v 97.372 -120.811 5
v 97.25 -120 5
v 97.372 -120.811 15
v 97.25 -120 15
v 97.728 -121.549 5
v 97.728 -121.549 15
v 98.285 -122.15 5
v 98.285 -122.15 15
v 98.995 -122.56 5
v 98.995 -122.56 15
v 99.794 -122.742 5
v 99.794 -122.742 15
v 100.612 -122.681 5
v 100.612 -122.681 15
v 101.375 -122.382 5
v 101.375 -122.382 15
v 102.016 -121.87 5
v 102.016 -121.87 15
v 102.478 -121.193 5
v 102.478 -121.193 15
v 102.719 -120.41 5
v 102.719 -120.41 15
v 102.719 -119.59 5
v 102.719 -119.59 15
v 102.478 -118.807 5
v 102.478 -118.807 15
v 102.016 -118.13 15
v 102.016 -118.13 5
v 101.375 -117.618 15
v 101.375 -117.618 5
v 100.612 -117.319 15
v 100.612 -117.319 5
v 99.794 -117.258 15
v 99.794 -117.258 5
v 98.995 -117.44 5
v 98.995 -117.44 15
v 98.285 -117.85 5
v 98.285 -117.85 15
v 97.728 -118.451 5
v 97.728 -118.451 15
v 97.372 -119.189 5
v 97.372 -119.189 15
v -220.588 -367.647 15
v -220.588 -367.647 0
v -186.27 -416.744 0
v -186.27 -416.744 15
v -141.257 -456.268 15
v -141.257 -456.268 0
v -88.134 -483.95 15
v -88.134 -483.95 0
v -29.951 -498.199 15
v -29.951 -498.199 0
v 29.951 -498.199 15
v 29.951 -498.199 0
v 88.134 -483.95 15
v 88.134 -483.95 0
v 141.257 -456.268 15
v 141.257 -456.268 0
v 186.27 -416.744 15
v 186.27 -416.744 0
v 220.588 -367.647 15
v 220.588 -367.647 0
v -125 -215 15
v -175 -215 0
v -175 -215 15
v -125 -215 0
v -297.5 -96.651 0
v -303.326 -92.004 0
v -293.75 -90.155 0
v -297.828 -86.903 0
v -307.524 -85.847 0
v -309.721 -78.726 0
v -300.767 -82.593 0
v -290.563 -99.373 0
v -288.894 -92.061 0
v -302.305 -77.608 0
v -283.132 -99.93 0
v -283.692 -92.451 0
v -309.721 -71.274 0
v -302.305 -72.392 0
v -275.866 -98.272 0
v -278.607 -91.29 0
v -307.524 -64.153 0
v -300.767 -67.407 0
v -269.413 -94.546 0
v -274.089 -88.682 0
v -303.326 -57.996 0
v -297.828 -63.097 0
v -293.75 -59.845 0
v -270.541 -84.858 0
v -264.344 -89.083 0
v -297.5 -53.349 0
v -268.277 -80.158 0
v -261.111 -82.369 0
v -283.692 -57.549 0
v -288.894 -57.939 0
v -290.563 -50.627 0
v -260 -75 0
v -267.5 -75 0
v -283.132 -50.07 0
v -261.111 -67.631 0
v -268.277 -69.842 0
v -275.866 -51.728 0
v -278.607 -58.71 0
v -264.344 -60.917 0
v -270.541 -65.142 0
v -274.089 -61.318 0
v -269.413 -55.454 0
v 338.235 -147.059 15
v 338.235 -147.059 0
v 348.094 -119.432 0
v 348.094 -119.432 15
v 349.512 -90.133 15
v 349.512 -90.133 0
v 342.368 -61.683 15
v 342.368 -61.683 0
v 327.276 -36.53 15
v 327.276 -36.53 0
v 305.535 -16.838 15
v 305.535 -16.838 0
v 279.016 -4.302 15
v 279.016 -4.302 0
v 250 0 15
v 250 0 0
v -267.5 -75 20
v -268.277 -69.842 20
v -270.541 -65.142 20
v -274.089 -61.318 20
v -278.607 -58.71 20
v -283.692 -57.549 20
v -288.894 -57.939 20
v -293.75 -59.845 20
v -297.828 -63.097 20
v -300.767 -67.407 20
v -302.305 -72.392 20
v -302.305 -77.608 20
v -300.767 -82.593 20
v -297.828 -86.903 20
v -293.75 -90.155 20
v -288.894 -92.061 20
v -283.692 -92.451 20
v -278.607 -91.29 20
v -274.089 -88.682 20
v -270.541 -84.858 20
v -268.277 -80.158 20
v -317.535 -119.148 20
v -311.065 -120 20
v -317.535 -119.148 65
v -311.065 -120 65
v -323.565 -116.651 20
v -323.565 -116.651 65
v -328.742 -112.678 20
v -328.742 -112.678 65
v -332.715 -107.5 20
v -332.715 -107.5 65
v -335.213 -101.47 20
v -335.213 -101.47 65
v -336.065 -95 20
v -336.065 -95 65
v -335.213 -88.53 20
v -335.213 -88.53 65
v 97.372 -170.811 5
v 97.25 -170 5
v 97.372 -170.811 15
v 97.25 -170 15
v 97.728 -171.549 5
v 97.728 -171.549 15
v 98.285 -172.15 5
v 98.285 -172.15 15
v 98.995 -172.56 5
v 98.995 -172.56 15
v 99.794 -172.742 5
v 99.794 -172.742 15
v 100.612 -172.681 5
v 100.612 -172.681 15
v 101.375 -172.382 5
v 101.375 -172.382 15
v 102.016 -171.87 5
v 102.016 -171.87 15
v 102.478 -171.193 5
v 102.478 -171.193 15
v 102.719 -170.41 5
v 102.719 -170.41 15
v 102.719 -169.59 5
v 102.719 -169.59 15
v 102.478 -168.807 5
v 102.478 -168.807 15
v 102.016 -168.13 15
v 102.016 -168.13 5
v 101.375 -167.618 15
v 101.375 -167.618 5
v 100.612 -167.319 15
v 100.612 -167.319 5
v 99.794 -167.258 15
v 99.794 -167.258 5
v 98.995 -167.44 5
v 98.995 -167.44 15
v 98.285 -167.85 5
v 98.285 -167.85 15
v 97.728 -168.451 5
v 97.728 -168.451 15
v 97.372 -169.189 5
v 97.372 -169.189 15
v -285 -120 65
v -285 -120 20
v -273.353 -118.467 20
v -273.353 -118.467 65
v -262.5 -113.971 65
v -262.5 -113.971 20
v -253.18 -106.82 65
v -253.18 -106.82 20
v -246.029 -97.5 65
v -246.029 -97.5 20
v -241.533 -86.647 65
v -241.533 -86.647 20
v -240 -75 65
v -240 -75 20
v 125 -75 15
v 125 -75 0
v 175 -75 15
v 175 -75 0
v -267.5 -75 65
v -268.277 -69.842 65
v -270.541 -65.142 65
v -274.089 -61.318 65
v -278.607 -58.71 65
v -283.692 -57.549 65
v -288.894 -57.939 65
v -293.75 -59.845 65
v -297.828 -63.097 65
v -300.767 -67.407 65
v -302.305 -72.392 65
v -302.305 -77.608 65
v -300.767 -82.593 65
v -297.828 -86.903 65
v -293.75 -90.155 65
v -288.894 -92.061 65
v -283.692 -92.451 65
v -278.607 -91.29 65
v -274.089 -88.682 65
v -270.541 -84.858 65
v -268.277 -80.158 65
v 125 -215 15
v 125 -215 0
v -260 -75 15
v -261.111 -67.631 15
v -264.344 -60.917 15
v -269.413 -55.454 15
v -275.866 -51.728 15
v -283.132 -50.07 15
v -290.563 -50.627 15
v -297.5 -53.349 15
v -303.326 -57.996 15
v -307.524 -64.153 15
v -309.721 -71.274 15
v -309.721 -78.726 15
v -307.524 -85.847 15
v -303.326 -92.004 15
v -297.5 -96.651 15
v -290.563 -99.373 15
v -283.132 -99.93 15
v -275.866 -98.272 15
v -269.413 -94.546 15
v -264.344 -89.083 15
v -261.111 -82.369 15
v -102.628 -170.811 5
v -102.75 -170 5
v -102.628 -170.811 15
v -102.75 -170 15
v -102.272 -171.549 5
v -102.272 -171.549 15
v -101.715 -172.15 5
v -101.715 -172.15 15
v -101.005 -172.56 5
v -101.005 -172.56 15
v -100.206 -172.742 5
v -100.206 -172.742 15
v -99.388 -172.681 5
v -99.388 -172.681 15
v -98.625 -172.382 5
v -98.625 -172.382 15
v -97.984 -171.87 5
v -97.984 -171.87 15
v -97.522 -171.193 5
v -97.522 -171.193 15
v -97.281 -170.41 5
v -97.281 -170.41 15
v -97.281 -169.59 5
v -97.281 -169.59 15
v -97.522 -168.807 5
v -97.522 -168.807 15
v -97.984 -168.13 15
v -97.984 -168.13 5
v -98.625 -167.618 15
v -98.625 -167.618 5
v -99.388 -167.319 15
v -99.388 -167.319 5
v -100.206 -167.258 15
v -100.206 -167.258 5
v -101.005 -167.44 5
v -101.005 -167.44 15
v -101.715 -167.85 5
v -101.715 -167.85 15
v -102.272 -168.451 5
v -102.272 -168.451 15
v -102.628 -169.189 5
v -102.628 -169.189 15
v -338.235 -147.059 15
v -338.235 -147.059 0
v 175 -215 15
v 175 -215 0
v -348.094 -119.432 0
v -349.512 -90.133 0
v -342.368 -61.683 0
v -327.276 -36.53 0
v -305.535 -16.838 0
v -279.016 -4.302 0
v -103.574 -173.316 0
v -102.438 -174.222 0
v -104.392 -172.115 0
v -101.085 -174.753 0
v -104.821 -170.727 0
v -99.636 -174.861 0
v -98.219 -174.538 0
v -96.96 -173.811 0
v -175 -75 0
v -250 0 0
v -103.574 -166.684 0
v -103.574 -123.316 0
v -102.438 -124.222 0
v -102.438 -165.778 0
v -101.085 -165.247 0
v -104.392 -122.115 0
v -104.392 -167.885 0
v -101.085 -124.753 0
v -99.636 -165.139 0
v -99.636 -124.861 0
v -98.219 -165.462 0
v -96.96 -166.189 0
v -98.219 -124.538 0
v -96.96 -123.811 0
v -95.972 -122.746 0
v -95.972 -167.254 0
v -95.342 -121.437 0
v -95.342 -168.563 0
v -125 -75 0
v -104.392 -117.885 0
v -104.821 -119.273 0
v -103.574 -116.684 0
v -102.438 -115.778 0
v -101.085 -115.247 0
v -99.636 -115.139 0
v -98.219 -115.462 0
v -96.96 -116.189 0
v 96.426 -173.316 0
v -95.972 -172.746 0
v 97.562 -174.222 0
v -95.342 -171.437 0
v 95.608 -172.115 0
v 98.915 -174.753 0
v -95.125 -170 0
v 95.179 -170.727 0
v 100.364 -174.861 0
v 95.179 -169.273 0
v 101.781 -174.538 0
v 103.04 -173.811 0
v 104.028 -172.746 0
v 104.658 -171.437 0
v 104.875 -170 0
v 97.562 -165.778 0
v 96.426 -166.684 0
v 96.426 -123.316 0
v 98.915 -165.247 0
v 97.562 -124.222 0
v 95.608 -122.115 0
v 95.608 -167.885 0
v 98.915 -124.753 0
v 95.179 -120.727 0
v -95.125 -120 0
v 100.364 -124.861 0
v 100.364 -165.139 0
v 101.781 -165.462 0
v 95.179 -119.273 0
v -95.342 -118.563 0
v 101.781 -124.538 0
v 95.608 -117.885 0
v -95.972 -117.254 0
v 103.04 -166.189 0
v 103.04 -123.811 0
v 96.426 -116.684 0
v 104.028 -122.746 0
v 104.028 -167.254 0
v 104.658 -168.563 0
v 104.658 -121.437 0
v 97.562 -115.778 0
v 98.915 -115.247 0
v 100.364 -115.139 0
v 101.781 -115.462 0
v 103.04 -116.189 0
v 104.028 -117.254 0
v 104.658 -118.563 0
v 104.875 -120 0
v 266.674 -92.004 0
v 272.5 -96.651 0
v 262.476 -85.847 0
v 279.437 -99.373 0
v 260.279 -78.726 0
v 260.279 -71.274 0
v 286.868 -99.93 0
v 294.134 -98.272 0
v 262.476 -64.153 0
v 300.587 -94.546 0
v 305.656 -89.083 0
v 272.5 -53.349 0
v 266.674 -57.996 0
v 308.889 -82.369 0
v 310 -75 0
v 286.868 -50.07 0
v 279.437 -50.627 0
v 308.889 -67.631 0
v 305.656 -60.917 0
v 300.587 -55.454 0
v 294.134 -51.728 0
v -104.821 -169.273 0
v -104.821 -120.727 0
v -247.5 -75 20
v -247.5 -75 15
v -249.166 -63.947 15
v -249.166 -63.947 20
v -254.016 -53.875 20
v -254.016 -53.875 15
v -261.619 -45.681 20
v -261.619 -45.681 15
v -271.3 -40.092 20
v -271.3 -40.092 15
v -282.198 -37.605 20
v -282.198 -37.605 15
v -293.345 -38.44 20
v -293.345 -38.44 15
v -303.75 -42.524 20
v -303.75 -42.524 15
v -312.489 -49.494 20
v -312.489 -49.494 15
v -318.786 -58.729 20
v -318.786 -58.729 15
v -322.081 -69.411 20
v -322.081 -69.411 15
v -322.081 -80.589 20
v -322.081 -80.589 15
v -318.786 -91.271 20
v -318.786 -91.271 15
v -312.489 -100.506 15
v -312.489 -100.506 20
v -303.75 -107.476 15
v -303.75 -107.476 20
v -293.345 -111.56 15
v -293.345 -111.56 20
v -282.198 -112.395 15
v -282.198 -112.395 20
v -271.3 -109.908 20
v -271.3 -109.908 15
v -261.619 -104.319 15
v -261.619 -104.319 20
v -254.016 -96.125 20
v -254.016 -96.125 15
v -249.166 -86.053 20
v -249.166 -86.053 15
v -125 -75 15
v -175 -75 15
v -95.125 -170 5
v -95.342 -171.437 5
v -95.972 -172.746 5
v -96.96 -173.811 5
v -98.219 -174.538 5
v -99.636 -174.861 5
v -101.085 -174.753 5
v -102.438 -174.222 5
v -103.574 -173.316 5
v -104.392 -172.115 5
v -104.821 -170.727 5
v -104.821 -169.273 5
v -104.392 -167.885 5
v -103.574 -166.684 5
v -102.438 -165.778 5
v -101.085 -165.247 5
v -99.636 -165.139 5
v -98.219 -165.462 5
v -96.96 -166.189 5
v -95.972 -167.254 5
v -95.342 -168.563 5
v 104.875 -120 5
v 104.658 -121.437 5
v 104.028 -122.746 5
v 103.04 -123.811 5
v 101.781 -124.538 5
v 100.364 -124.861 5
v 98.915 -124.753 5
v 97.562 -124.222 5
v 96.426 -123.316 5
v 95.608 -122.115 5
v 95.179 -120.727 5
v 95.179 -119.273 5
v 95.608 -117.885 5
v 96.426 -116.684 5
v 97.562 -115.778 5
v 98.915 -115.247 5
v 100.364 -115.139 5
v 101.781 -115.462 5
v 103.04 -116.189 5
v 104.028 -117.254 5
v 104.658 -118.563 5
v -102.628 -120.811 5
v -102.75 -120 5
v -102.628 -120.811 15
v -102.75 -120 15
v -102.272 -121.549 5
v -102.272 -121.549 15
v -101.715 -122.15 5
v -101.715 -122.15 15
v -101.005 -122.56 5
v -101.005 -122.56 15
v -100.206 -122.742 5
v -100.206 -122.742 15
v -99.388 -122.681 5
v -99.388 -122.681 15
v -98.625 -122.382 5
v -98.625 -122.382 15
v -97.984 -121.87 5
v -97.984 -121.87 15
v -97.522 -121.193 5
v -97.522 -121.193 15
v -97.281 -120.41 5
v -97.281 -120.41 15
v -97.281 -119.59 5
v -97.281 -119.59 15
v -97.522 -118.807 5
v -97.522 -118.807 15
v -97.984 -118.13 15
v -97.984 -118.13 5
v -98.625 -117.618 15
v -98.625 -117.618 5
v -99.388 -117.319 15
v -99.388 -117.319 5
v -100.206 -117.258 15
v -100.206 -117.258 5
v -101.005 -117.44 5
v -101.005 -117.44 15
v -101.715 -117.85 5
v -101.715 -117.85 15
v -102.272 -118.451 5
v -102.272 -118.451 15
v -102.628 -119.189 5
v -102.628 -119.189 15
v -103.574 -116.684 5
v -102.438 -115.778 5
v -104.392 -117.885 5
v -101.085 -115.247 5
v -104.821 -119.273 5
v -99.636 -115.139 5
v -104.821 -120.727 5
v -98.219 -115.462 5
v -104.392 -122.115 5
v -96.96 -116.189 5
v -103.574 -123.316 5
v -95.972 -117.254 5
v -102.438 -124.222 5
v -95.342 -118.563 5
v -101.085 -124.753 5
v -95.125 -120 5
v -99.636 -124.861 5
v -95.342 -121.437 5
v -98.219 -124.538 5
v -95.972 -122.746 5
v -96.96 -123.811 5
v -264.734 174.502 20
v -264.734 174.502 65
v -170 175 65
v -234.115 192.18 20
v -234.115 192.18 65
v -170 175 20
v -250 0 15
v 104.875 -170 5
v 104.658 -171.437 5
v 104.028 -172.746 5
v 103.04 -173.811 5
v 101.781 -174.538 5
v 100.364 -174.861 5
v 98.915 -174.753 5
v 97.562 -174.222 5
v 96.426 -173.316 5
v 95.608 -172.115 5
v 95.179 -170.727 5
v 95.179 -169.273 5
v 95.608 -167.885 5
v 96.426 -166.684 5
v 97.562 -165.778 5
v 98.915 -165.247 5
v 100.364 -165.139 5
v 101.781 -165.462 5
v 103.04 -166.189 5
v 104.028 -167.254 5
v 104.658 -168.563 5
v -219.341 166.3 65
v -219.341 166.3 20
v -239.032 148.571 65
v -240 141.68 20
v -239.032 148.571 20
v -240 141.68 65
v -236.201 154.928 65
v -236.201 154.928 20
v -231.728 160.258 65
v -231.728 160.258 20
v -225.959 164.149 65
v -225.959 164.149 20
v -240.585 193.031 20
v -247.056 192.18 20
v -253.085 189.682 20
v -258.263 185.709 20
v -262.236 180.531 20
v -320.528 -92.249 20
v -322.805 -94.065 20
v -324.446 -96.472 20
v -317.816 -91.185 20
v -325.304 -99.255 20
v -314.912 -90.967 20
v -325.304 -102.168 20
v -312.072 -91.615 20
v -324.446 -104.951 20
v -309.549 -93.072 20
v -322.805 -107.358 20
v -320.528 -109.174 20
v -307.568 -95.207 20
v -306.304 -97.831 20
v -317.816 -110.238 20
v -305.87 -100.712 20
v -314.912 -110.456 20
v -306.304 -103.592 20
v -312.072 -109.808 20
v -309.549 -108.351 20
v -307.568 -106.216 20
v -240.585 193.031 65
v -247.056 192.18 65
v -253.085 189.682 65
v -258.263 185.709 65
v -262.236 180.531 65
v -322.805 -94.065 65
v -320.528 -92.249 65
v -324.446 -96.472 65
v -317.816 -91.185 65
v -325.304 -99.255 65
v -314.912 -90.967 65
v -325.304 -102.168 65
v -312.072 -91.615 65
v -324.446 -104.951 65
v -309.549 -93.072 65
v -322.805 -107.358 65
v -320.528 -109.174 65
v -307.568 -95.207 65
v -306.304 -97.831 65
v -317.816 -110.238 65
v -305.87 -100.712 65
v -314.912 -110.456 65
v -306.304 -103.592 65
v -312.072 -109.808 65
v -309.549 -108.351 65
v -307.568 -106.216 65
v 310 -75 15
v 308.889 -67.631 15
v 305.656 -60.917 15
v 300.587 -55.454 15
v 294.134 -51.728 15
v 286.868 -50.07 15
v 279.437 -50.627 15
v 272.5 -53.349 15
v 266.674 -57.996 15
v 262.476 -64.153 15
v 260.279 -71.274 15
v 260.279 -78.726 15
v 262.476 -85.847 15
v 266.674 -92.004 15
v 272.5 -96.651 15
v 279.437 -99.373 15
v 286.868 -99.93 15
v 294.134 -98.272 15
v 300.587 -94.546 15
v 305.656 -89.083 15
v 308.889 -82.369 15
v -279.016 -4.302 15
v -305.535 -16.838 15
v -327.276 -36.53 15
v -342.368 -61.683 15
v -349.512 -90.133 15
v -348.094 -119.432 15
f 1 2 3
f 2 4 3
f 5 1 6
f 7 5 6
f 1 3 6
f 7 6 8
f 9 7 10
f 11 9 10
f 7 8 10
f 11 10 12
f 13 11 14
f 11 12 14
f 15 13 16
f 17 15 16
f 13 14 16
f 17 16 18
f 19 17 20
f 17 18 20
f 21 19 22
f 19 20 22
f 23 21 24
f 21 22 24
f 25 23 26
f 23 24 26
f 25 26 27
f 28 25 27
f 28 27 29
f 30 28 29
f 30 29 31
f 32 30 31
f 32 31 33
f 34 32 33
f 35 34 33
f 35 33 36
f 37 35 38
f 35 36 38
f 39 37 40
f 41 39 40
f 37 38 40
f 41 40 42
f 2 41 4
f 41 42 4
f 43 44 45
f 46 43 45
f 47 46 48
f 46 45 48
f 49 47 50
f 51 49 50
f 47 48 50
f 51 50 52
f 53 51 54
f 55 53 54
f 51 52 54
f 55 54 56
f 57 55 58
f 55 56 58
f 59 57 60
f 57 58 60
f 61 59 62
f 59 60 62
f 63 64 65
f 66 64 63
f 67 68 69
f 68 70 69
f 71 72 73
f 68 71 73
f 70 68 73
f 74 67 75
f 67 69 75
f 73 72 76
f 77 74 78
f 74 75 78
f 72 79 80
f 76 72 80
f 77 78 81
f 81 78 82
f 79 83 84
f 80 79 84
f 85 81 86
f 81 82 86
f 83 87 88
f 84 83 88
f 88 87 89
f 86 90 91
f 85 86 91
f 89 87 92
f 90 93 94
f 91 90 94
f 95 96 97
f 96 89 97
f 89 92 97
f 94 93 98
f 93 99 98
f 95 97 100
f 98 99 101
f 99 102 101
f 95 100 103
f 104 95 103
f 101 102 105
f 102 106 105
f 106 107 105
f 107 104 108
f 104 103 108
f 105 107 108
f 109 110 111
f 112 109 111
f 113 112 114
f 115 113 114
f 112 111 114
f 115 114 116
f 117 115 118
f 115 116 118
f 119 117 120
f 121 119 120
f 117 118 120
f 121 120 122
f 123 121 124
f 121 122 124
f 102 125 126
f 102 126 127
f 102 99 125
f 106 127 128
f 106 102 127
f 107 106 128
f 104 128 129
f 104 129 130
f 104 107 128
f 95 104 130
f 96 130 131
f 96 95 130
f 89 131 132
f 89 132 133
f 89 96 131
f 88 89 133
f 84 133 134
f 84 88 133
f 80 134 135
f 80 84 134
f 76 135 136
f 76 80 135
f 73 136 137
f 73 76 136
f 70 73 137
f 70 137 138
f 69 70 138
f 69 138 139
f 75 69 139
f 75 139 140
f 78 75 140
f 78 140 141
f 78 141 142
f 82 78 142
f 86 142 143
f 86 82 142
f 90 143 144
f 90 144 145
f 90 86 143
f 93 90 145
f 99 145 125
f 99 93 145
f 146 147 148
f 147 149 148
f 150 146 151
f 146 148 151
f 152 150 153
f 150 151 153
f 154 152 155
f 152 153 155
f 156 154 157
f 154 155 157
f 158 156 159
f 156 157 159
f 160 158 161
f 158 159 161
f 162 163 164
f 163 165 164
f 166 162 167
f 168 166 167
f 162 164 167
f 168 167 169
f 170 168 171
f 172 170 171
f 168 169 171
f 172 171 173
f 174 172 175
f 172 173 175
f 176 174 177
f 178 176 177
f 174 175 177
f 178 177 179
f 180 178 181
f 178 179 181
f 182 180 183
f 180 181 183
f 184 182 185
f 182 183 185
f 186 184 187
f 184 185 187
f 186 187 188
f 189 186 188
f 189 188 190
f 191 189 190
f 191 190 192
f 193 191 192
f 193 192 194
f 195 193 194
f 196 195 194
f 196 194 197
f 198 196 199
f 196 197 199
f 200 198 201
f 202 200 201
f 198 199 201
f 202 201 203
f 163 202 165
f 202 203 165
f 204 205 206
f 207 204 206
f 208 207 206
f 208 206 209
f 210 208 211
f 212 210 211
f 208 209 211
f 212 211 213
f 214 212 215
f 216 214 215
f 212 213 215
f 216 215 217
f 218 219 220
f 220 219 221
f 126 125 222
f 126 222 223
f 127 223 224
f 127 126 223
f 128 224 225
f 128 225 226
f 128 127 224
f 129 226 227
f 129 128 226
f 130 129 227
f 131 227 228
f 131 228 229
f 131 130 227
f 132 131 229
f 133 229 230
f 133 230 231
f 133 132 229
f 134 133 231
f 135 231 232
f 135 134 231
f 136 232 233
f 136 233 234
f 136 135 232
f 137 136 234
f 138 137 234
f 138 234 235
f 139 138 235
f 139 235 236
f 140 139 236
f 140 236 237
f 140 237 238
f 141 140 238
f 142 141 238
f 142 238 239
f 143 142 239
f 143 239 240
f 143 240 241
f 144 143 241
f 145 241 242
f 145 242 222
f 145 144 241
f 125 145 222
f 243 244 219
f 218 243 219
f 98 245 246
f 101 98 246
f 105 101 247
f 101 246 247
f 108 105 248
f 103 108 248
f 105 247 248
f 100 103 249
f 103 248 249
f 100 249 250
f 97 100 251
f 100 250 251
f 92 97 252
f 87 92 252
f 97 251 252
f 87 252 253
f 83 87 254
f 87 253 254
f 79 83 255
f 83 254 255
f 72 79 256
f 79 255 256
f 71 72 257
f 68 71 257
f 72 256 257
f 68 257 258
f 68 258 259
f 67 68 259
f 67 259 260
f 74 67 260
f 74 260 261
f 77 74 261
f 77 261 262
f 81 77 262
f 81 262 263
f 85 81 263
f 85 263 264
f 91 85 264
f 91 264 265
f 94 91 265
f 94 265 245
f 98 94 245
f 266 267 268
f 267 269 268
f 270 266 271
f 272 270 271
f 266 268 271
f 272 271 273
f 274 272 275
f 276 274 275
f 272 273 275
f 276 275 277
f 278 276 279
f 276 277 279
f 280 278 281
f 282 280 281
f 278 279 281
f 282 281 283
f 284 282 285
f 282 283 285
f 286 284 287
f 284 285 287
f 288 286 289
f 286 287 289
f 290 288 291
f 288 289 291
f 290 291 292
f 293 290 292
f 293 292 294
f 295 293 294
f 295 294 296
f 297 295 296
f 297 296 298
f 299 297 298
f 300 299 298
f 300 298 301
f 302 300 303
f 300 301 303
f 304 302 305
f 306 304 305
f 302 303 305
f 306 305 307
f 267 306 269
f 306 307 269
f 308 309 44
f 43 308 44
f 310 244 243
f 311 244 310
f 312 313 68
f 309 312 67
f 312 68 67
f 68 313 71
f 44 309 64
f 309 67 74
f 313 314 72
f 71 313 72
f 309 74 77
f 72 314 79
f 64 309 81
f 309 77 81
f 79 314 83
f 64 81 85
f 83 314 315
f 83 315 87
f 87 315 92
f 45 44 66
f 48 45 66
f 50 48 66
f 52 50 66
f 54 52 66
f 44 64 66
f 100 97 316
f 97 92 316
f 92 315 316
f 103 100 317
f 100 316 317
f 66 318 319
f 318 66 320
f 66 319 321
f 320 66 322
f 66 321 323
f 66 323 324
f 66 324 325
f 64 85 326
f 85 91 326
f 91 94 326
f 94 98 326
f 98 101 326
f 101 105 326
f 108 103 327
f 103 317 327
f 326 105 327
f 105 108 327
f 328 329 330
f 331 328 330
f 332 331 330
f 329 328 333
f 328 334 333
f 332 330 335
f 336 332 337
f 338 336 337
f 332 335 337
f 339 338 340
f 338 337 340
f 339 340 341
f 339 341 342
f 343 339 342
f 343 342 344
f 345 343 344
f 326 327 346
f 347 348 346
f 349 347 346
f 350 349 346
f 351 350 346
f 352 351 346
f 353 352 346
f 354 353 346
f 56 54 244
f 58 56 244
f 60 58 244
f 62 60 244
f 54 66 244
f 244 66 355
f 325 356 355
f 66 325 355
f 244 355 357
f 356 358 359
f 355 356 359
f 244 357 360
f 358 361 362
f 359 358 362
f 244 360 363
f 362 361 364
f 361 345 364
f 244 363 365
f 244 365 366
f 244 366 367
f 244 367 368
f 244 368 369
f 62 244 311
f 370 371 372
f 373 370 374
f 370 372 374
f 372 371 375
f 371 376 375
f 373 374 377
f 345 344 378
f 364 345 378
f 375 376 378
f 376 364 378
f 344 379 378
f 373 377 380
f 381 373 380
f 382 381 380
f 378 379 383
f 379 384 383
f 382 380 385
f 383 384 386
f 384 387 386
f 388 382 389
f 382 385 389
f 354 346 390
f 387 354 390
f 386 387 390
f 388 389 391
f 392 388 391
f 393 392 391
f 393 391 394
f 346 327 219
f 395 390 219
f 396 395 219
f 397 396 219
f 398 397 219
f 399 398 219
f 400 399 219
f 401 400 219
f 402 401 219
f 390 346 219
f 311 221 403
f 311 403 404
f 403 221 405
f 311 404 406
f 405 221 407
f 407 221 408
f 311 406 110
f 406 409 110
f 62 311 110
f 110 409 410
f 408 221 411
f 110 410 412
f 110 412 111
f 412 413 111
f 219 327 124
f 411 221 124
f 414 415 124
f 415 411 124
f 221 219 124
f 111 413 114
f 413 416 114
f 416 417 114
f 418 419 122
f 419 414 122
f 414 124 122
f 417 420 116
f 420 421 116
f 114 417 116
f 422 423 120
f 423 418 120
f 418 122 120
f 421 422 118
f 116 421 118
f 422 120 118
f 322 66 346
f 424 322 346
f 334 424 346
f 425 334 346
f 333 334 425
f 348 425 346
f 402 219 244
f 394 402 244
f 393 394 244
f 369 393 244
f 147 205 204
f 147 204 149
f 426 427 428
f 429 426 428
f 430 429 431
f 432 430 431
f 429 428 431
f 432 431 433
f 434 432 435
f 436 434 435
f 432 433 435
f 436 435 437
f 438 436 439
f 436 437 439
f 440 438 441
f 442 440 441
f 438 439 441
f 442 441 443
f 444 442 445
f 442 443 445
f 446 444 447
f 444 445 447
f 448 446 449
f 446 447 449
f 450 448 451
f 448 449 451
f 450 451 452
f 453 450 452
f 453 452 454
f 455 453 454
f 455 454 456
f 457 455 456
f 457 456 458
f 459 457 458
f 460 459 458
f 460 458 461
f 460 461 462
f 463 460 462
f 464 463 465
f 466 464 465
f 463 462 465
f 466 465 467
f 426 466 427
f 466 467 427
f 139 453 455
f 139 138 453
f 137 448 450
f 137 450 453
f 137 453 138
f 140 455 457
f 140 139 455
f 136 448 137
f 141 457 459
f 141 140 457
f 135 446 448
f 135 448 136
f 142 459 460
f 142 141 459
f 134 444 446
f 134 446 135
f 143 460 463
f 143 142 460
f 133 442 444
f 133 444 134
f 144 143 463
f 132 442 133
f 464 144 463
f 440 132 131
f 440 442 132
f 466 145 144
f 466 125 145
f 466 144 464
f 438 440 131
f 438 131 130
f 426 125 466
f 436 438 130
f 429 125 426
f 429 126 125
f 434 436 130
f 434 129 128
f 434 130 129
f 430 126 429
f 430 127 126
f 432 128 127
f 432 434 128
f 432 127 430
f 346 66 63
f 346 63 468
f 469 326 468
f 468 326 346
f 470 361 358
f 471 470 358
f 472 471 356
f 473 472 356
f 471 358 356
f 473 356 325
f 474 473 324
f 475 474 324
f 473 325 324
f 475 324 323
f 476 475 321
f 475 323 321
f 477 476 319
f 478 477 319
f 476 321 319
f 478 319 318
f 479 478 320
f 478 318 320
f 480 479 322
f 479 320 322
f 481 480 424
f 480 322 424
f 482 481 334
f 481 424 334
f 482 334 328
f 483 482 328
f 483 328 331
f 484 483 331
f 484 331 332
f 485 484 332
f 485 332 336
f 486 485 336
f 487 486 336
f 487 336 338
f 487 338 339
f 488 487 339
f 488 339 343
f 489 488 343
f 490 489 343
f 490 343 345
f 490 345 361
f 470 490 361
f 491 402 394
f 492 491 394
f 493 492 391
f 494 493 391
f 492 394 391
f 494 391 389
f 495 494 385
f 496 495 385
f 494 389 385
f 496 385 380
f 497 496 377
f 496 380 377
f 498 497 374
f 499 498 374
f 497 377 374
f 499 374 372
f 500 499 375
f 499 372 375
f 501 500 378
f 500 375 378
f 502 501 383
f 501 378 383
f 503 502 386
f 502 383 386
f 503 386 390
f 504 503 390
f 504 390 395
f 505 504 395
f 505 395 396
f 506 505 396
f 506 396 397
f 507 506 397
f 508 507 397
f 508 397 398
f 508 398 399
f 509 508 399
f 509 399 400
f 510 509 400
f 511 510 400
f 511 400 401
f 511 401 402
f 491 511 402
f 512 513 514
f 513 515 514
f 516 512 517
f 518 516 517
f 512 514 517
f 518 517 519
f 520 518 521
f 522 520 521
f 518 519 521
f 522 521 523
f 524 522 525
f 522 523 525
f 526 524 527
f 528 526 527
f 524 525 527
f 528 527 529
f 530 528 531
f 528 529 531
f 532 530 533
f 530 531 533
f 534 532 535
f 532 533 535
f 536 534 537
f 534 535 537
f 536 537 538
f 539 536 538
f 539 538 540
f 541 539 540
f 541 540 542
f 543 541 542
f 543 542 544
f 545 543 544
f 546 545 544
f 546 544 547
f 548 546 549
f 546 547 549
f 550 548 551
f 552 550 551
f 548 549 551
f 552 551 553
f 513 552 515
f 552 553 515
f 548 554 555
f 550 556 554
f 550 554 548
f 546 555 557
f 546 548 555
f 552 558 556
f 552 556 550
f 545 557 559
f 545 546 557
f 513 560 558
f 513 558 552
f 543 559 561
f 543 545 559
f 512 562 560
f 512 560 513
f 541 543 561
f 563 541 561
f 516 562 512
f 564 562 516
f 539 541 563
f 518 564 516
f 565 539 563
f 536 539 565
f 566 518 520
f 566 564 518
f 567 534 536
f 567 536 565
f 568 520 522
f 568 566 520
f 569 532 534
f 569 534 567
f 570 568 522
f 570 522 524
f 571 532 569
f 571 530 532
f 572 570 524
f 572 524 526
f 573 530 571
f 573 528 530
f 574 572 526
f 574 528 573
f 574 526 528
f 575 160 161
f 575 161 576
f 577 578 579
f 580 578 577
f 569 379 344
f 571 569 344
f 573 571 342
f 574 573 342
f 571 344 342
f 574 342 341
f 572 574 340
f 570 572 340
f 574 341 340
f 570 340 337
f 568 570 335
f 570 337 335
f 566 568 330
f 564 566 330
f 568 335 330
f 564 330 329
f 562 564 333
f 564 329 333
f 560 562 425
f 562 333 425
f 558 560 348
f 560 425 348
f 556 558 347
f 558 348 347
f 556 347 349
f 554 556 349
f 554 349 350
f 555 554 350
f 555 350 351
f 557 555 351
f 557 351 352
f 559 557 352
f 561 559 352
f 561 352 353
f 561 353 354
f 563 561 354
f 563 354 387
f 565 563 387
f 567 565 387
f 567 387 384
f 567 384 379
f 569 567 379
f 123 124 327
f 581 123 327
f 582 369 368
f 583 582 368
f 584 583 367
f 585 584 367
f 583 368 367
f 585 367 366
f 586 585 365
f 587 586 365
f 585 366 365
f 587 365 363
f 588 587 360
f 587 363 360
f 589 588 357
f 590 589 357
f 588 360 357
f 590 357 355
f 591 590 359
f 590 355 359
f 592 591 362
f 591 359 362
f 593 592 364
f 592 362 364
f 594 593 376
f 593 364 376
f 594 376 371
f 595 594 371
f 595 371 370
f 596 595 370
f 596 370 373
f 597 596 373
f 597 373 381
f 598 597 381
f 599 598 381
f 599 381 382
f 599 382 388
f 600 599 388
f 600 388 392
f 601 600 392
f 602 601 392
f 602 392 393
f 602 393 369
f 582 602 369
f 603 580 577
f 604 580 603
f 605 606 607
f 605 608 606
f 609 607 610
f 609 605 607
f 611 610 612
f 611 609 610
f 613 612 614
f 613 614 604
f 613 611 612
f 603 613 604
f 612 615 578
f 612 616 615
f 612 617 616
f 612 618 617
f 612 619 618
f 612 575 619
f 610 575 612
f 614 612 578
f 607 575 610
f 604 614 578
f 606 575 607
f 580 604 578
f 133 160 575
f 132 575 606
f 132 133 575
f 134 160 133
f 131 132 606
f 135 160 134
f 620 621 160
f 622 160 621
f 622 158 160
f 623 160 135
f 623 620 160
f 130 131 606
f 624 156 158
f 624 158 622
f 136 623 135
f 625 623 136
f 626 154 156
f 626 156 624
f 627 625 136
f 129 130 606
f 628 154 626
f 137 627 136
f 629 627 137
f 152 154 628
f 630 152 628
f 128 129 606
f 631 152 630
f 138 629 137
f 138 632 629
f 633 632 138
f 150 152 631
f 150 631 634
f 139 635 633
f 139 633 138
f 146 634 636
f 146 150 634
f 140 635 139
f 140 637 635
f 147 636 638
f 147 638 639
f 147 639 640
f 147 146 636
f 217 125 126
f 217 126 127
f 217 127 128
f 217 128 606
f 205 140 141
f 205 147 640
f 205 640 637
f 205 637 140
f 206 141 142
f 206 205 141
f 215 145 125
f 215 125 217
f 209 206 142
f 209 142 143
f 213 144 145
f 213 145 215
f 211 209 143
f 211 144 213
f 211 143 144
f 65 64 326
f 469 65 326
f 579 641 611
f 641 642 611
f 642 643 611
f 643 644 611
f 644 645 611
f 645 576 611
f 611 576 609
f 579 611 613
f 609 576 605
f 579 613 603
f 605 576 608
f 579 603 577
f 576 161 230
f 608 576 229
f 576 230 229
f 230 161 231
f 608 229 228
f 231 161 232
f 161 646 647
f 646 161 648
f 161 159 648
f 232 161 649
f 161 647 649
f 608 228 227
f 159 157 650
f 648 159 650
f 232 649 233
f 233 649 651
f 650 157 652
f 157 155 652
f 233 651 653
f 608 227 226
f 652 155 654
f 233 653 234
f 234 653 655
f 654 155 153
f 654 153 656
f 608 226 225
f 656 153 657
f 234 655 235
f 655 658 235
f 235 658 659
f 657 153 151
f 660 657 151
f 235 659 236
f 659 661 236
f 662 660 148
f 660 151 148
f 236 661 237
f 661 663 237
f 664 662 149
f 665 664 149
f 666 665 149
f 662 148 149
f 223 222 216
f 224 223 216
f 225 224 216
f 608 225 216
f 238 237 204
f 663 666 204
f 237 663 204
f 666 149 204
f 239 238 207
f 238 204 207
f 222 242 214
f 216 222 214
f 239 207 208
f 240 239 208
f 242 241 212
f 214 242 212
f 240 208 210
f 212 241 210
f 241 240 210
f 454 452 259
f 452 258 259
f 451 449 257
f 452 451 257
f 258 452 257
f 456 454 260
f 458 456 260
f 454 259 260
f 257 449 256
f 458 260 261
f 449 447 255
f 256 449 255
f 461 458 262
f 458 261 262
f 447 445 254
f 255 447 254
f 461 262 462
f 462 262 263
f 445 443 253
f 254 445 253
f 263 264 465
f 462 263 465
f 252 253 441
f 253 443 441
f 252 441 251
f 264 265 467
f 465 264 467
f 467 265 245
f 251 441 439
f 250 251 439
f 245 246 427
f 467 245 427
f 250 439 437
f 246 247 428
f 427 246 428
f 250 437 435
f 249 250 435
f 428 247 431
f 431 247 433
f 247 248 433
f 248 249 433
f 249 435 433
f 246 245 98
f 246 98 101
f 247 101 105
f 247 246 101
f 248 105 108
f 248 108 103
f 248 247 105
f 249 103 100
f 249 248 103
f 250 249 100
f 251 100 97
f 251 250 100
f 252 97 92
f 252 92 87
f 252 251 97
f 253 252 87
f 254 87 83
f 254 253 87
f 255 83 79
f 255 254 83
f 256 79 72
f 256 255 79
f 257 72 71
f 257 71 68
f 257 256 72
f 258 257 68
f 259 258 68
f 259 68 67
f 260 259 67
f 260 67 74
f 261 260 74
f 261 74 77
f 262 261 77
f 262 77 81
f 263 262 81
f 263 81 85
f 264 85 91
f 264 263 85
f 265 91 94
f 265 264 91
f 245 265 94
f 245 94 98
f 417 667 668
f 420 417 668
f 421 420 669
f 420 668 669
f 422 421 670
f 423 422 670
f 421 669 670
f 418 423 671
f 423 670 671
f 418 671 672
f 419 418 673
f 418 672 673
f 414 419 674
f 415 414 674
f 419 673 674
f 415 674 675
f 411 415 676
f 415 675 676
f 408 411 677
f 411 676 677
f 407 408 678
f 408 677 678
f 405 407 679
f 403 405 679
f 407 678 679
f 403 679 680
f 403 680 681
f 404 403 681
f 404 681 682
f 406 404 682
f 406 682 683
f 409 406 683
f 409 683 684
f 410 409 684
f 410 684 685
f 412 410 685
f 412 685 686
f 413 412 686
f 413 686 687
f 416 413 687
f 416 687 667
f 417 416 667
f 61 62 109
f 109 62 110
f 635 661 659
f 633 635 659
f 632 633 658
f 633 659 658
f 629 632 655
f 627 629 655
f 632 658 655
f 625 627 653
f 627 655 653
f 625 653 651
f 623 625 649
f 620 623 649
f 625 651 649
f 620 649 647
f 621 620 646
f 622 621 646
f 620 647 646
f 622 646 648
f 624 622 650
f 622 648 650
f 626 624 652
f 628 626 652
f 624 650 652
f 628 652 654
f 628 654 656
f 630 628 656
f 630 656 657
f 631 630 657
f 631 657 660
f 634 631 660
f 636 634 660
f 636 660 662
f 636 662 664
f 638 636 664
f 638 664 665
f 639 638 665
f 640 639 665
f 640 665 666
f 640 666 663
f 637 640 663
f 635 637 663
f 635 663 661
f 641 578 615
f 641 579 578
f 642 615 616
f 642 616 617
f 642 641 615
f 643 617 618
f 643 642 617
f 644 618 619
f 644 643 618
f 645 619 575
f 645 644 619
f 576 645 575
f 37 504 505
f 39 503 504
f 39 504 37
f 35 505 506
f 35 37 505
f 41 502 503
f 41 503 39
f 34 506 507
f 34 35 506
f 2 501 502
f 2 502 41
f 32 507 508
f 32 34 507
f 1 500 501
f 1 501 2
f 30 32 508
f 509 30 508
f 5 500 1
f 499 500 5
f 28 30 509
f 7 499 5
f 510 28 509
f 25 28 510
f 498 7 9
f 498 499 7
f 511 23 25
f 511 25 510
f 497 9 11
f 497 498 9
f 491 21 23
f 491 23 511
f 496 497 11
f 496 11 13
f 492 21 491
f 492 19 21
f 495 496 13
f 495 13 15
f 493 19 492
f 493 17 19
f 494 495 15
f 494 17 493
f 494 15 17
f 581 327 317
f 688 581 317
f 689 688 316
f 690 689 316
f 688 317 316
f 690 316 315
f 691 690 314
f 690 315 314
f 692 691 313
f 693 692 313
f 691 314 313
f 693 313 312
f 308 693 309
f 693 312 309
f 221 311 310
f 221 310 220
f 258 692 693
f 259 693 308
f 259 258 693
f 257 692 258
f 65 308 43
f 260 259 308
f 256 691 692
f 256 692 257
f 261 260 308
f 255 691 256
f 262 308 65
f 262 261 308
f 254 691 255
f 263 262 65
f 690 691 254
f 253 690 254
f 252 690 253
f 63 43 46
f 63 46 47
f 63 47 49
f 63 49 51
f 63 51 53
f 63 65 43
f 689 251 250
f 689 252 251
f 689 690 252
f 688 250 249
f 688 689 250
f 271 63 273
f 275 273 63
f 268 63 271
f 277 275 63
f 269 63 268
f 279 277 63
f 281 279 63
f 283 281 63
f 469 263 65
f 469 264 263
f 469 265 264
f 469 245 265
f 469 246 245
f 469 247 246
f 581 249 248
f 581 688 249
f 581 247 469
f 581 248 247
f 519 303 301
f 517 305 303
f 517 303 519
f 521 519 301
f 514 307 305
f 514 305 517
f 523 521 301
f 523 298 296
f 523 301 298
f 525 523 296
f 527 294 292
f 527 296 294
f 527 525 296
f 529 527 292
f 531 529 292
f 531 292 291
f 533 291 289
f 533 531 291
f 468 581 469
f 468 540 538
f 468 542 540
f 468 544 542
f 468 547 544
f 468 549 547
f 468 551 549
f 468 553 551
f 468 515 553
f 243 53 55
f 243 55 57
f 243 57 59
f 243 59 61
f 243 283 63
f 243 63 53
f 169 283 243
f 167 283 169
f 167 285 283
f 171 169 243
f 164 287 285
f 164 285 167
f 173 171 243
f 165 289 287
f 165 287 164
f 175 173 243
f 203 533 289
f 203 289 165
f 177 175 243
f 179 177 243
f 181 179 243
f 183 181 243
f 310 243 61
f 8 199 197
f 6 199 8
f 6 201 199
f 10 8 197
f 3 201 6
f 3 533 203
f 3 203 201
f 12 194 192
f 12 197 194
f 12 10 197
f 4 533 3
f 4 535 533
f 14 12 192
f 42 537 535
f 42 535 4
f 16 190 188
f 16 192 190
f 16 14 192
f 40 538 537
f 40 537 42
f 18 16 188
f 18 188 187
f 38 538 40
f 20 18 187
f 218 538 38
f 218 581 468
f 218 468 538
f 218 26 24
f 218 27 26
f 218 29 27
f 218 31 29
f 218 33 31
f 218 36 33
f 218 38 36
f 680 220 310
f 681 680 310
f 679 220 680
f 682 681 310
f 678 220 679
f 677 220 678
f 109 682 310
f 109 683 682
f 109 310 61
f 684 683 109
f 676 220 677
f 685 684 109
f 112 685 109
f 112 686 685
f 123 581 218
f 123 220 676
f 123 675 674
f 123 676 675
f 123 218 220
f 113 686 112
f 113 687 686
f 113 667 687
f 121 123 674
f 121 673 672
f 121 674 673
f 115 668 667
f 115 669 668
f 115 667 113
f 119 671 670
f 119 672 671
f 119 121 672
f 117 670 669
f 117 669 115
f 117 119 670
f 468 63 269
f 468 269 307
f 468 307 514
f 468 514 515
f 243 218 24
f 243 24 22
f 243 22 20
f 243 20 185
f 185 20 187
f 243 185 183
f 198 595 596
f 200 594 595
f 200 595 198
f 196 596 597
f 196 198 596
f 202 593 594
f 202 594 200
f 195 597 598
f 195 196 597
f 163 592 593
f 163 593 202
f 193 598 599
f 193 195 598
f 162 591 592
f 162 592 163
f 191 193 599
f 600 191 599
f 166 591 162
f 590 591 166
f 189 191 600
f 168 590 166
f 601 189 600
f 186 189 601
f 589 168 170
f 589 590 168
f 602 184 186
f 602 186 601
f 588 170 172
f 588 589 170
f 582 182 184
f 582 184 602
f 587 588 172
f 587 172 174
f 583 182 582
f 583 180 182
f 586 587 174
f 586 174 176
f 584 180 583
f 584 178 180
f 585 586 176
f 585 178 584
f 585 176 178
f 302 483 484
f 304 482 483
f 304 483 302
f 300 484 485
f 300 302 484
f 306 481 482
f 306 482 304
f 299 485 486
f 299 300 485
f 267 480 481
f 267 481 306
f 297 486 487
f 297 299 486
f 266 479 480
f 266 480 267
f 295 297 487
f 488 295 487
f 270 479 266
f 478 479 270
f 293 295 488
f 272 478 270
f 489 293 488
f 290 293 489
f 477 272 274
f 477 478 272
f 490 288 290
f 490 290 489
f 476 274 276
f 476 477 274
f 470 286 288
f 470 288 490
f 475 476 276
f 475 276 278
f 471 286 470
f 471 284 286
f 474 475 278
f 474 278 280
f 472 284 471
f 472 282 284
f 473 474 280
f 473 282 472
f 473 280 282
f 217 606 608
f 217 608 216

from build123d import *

# Parameters (mm, degrees)
F0_W           = 50
F0_H           = 140
F1_DEPTH       = 15
F2_R           = 25
F3_DEPTH       = 15.001
F4_R           = 25
F4_R_2         = 17.5
F5_DEPTH       = 15
F6_R           = 37.5
F6_R_2         = 17.5
F7_DEPTH       = 5
F9_D           = 5.5
F9_CBORE_D     = 9.75
F9_CBORE_DEPTH = 5
F10_R          = 45
F10_R_2        = 17.5
F11_DEPTH      = 45
F12_R          = 17.5
F13_DEPTH      = 45
F14_R          = 9.7715412821
F15_DEPTH      = 65.001
F16_R          = 25


with BuildPart() as f1:
    # F0 (on Top) → F1 (new body)
    with BuildSketch(Plane.XY):
        with BuildLine():
            Line((250, 0), (-250, 0))
            ThreePointArc((-250, 0), (-335.7492925713, -48.5504244572), (-338.2352941176, -147.0588235294))
            Line((-338.2352941176, -147.0588235294), (-220.5882352941, -367.6470588235))
            ThreePointArc((-220.5882352941, -367.6470588235), (0, -500), (220.5882352941, -367.6470588235))
            Line((220.5882352941, -367.6470588235), (338.2352941176, -147.0588235294))
            ThreePointArc((338.2352941176, -147.0588235294), (335.7492925713, -48.5504244572), (250, 0))
        make_face()
        with Locations((-150, -145)):
            Rectangle(F0_W, F0_H, mode=Mode.SUBTRACT)
        with Locations((150, -145)):
            Rectangle(F0_W, F0_H, mode=Mode.SUBTRACT)
    extrude(amount=F1_DEPTH)

    # F2 (on face) → F3 (cut, through all)
    with BuildSketch(Plane.XY.offset(15)):
        with Locations((-285, -75)):
            Circle(F2_R)
        with Locations((285, -75)):
            Circle(F2_R)
    extrude(amount=-F3_DEPTH, mode=Mode.SUBTRACT)

    # F9 (through all)
    with Locations(Plane(origin=(0, 0, 0), x_dir=(1, 0, 0), z_dir=(0, 0, -1))):
        with Locations((-100, 120), (-100, 170), (100, 120), (100, 170)):
            CounterBoreHole(F9_D / 2, F9_CBORE_D / 2, F9_CBORE_DEPTH)


with BuildPart() as f5:
    # F4 (on face) → F5 (new body)
    with BuildSketch(Plane.XY.offset(15)):
        with Locations((-285, -75)):
            Circle(F4_R)
        with Locations((-285, -75)):
            Circle(F4_R_2, mode=Mode.SUBTRACT)
    extrude(amount=-F5_DEPTH)

    # F6 (on face) → F7 (join)
    with BuildSketch(Plane.XY.offset(15)):
        with Locations((-285, -75)):
            Circle(F6_R)
        with Locations((-285, -75)):
            Circle(F6_R_2, mode=Mode.SUBTRACT)
    extrude(amount=F7_DEPTH)


with BuildPart() as f11:
    # F10 (on face) → F11 (new body)
    with BuildSketch(Plane.XY.offset(20)):
        with Locations((-285, -75)):
            Circle(F10_R)
        with Locations((-285, -75)):
            Circle(F10_R_2, mode=Mode.SUBTRACT)
    extrude(amount=F11_DEPTH)

    # F12 (on face) → F13 (join, through all)
    with BuildSketch(Plane(origin=(0, 0, 20), x_dir=(1, 0, 0), z_dir=(0, 0, -1))):
        with BuildLine():
            Line((-240, -162.6571113504), (-240, 75))
            ThreePointArc((-240, 75), (-253.1801948466, 106.8198051534), (-285, 120))
            Line((-285, 120), (-343.6451417779, 120))
            Line((-343.6451417779, 120), (-258.2631229006, -198.6500325027))
            Line((-258.2631229006, -198.6500325027), (-170, -175))
            Line((-170, -175), (-240, -162.6571113504))
        make_face()
        with Locations((-285, 75)):
            Circle(F12_R, mode=Mode.SUBTRACT)
    extrude(amount=-F13_DEPTH)

    # F14 (on face) → F15 (cut, through all)
    with BuildSketch(Plane.XY.offset(65)):
        with Locations((-315.6417777248, -100.7115043875)):
            Circle(F14_R)
    extrude(amount=-F15_DEPTH, mode=Mode.SUBTRACT)

    # F16
    f16_edges = [f11.edges().sort_by_distance(p)[0] for p in [
        (-240, 162.657111, 42.5),
        (-258.263123, 198.650033, 42.5),
        (-343.645142, -120, 42.5),
    ]]
    fillet(f16_edges, radius=F16_R)


solid = Compound([f1.part, f5.part, f11.part])
